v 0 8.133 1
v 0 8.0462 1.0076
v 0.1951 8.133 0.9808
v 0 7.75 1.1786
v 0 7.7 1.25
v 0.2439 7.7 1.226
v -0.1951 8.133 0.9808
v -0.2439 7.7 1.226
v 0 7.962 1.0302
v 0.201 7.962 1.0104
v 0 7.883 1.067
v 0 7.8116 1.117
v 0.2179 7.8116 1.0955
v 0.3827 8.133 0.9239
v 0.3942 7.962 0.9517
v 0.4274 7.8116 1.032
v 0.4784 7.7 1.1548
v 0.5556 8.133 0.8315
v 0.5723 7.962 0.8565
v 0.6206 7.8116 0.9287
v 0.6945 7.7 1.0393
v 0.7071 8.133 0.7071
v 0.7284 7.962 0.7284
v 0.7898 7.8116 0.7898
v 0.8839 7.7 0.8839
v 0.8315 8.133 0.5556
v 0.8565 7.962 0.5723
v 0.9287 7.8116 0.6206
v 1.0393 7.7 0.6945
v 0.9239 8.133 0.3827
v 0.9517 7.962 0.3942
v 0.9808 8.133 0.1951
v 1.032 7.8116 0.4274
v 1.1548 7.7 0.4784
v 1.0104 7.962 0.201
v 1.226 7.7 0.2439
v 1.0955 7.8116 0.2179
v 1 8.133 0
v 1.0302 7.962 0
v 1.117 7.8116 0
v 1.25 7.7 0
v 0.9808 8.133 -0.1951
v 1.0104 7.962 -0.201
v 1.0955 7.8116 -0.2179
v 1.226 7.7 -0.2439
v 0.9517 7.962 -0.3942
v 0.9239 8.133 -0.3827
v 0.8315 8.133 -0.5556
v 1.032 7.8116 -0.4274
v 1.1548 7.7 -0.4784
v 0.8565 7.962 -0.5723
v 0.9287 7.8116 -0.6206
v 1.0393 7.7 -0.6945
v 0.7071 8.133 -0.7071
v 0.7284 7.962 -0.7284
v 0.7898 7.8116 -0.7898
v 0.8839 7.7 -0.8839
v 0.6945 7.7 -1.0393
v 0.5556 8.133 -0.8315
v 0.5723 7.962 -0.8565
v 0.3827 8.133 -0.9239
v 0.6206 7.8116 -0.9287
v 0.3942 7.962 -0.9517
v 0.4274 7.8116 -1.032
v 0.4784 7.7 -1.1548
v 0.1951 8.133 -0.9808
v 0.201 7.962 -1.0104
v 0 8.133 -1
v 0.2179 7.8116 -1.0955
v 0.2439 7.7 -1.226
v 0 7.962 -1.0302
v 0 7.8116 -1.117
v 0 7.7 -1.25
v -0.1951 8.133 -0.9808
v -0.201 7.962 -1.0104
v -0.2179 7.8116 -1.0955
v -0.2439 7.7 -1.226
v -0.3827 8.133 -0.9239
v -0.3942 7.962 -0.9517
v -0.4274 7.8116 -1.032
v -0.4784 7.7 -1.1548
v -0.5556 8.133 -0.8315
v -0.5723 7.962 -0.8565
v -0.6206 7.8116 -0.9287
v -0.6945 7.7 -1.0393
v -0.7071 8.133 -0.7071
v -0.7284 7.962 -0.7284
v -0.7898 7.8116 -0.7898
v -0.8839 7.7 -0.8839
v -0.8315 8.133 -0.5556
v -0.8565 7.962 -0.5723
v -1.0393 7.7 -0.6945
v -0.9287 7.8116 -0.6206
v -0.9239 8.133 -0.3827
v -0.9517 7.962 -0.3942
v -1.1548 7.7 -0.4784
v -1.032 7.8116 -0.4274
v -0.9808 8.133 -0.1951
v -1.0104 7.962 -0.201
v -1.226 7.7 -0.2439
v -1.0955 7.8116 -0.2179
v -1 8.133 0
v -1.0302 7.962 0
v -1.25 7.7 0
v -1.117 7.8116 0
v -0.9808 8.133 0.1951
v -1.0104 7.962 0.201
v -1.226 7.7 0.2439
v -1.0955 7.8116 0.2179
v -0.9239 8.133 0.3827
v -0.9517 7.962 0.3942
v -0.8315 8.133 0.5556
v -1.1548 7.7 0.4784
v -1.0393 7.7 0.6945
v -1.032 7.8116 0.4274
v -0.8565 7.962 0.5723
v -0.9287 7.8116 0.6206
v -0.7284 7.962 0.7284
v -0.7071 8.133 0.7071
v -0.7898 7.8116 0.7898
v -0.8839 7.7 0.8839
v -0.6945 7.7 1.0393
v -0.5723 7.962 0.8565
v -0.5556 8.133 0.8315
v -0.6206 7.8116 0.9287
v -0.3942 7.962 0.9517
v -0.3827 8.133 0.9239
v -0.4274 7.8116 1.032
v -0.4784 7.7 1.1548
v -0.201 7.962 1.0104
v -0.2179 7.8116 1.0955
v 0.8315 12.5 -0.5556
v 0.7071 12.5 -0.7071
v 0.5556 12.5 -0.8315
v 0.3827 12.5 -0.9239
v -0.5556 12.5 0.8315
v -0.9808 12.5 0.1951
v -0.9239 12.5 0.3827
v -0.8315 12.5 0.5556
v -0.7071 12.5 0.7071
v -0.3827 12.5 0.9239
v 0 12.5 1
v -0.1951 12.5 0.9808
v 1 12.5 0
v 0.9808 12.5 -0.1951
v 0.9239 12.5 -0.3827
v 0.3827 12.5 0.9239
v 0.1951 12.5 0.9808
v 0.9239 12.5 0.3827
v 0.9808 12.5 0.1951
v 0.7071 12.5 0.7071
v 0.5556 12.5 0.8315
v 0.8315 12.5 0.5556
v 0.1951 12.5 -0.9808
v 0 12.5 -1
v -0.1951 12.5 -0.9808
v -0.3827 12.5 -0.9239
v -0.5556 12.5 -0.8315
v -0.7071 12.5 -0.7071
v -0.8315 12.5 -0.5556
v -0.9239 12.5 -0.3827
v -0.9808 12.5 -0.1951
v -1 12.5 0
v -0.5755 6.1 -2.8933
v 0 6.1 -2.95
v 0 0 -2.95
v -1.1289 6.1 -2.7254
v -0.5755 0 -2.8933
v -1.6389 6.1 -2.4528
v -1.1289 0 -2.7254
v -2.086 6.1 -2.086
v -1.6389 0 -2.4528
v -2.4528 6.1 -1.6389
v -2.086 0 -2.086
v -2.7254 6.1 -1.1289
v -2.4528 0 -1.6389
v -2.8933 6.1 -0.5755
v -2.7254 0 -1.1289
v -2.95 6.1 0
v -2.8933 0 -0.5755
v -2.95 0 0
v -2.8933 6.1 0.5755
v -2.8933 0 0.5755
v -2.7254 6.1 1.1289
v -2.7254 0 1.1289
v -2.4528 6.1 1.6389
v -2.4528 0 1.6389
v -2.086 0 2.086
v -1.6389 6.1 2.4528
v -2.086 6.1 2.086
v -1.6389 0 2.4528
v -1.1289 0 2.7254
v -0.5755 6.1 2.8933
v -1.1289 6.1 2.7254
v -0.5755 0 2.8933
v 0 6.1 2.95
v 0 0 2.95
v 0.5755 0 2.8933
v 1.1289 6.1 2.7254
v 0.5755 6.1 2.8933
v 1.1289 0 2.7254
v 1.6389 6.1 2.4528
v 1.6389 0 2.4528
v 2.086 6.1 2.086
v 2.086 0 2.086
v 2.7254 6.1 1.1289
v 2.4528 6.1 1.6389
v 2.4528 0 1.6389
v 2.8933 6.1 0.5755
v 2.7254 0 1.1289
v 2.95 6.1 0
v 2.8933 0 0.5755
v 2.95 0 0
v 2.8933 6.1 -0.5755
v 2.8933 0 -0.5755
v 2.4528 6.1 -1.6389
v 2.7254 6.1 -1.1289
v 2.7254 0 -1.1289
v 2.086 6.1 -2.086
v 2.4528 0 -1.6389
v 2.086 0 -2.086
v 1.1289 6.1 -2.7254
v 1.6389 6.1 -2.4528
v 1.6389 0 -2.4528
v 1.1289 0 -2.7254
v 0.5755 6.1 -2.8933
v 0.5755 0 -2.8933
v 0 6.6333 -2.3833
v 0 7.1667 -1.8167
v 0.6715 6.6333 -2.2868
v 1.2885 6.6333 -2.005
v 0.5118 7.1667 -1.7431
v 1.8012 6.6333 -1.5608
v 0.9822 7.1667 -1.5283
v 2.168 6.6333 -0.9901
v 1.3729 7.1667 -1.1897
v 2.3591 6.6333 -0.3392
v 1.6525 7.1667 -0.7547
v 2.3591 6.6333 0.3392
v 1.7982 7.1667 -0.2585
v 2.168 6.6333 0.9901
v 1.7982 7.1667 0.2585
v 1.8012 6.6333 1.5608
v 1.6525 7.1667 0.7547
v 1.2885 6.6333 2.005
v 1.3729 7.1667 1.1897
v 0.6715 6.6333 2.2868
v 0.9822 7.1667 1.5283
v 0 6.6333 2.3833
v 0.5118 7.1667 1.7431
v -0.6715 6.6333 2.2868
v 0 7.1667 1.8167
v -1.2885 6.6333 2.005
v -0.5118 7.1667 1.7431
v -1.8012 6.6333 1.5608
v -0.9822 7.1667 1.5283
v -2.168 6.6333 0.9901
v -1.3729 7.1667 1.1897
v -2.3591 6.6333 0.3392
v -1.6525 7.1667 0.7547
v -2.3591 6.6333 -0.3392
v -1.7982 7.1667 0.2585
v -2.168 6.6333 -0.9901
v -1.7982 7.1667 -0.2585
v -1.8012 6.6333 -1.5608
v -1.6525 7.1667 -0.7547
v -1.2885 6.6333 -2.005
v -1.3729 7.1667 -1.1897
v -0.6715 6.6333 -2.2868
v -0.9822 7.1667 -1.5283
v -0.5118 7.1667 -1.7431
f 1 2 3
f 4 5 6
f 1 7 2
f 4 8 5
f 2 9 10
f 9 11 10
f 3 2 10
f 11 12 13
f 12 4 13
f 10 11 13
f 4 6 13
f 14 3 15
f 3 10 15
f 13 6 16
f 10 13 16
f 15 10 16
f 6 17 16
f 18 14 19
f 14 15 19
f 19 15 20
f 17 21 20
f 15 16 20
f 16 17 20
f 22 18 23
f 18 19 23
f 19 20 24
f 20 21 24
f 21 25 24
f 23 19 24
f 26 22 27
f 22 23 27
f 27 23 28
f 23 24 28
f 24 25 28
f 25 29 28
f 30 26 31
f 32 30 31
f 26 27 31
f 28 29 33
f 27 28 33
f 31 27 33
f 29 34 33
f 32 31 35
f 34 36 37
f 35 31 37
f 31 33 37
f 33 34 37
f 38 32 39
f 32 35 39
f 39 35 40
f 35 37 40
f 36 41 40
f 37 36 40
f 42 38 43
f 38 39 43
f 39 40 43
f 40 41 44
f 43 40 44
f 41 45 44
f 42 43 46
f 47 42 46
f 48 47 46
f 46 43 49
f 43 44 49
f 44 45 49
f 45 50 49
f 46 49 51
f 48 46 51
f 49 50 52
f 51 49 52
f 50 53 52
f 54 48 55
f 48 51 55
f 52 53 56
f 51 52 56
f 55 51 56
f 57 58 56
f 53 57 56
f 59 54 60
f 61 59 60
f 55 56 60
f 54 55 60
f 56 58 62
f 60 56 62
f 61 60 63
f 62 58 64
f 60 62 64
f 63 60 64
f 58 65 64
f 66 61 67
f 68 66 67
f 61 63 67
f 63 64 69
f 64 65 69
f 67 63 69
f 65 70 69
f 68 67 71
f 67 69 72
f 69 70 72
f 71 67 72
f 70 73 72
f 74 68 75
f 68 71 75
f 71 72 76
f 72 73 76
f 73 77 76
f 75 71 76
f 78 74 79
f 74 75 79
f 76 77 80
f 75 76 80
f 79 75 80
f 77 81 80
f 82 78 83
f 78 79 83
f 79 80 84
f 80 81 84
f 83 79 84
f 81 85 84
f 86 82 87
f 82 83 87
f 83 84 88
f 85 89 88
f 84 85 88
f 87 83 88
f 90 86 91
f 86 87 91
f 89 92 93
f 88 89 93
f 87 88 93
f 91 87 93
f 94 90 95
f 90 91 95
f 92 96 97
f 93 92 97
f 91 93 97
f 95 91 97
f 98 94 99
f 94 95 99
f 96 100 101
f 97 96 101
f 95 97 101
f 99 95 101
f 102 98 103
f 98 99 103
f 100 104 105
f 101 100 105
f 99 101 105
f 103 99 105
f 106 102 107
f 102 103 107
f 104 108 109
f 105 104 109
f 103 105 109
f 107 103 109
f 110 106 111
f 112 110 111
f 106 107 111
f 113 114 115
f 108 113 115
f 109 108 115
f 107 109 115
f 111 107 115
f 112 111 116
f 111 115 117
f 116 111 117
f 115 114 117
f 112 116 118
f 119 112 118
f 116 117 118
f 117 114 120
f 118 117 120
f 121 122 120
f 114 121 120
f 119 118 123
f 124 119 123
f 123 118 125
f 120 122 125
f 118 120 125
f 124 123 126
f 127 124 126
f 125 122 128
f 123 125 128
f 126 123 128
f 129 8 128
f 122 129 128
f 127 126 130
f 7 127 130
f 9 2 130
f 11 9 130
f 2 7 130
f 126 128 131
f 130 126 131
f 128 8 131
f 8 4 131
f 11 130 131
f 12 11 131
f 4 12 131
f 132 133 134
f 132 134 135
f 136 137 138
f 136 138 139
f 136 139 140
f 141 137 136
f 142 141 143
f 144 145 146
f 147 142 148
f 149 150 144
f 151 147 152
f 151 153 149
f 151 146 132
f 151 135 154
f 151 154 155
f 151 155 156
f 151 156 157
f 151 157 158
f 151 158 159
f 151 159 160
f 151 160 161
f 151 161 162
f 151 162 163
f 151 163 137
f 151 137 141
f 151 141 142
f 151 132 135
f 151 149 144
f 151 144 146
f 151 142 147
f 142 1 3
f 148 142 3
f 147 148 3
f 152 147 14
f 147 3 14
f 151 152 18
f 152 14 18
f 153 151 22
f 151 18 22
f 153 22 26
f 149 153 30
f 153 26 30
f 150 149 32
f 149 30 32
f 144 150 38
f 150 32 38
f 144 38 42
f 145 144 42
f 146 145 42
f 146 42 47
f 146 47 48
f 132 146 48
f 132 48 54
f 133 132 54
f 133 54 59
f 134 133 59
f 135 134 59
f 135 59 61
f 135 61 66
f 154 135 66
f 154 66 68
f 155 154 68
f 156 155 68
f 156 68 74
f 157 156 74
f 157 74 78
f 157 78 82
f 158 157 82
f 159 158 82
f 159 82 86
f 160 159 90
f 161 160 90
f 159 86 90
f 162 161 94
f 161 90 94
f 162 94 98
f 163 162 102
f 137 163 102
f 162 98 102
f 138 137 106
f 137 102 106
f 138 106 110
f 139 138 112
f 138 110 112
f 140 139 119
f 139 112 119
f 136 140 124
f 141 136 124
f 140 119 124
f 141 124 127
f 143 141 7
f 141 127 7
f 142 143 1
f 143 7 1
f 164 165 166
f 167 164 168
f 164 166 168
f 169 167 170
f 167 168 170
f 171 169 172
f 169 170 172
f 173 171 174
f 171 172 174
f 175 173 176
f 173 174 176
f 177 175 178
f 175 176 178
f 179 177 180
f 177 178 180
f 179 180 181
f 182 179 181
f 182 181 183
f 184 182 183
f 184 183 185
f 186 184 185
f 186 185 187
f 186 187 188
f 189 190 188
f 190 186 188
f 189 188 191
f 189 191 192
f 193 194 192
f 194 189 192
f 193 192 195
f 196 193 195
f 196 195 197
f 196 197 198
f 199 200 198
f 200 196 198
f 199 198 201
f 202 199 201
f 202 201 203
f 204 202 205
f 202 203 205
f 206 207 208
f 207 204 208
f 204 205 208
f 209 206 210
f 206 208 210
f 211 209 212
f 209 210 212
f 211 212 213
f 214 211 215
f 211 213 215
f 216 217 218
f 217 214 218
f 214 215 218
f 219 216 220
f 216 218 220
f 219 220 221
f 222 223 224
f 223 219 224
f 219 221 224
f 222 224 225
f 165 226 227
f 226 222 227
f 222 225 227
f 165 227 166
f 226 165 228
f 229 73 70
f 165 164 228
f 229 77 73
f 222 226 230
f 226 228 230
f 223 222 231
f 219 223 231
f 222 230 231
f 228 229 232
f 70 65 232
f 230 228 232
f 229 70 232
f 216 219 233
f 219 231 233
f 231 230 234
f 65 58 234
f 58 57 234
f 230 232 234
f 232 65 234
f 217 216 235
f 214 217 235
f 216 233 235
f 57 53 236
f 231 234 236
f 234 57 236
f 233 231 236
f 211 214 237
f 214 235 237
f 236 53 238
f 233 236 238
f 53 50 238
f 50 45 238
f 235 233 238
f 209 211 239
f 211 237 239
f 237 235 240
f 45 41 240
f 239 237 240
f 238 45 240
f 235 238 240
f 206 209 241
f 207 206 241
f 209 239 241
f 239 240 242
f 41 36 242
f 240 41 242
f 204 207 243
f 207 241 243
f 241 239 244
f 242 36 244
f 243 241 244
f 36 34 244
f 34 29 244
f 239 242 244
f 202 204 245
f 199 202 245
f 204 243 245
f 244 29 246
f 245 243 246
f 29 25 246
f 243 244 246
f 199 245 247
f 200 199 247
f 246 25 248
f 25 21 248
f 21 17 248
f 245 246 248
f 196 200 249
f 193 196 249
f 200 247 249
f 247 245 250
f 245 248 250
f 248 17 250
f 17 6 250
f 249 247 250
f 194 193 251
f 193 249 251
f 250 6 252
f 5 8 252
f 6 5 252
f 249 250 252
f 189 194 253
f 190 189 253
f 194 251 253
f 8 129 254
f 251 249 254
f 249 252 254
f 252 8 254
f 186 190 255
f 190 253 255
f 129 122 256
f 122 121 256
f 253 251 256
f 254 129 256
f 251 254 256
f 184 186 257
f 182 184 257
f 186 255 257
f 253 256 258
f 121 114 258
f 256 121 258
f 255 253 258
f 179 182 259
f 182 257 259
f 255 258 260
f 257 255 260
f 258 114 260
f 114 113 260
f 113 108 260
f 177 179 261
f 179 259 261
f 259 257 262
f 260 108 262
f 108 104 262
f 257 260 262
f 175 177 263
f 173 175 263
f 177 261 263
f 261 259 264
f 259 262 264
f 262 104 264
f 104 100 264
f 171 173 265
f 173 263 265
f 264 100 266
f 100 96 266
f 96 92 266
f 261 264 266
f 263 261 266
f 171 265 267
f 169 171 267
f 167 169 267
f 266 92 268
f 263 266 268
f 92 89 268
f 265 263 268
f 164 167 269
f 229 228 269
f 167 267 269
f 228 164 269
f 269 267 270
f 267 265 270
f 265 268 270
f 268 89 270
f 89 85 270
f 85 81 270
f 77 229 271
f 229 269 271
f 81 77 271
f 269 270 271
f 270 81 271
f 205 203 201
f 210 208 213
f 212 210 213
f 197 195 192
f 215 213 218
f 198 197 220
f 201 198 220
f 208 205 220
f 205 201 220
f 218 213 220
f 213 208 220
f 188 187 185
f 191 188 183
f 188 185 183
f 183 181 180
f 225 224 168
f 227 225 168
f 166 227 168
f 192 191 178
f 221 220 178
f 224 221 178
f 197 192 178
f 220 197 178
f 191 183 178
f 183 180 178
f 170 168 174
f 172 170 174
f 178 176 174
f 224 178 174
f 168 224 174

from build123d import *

# Parameters (mm, degrees)
SKETCH1_R           = 2.95
BOSS_EXTRUDE1_DEPTH = 7.7
SKETCH3_R           = 1
BOSS_EXTRUDE2_DEPTH = 4.8
FILLET1_R           = 0.5


with BuildPart() as part:
    # Sketch1 → Boss-Extrude1 (new body)
    with BuildSketch(Plane(origin=(0, 0, 0), x_dir=(1, 0, 0), z_dir=(0, 1, 0))):
        with Locations(Location((0, 0, 0), (0, 0, 90))):
            Circle(SKETCH1_R)
    extrude(amount=BOSS_EXTRUDE1_DEPTH)

    # Sketch2 → Cut-Revolve1 (revolve, cut)
    with BuildSketch(Plane.XY, mode=Mode.PRIVATE) as cut_revolve1_sk:
        Polygon((-2.95, 6.1), (-1.25, 7.7), (-2.95, 7.7), align=None)
    revolve(cut_revolve1_sk.sketch.rotate(Axis((0, 7.7, 0), (0, -1, 0)), 90), axis=Axis((0, 7.7, 0), (0, -1, 0)), mode=Mode.SUBTRACT)

    # Sketch3 → Boss-Extrude2 (add)
    with BuildSketch(Plane(origin=(0, 7.7, 0), x_dir=(1, 0, 0), z_dir=(0, 1, 0))):
        with Locations(Location((0, 0, 0), (0, 0, 270))):
            Circle(SKETCH3_R)
    extrude(amount=BOSS_EXTRUDE2_DEPTH)

    # Fillet1
    # the kernel refuses this fillet: 0.5 mm, written as the material it adds along each edge
    with BuildSketch(Plane(origin=(0, 7.7, 0), x_dir=(0, 0, 1), z_dir=(-1, 0, 0))) as fillet1_piece_1:
        with BuildLine():
            CenterArc((1.5, 0.433012702), FILLET1_R, 180, 60)
            Line((1, 0.433012702), (0.99, 0.433012702))
            Line((0.99, 0.433012702), (0.99, 0))
            Line((0.99, 0), (1, -0.01))
            ThreePointArc((1, -0.01), (1.125, -0.01), (1.245, -0.008660254))
            Line((1.245, -0.008660254), (1.25, 0))
        make_face()
    revolve(axis=Axis((0, 7.7, 0), (0, 1, 0)))


solid = part.part
